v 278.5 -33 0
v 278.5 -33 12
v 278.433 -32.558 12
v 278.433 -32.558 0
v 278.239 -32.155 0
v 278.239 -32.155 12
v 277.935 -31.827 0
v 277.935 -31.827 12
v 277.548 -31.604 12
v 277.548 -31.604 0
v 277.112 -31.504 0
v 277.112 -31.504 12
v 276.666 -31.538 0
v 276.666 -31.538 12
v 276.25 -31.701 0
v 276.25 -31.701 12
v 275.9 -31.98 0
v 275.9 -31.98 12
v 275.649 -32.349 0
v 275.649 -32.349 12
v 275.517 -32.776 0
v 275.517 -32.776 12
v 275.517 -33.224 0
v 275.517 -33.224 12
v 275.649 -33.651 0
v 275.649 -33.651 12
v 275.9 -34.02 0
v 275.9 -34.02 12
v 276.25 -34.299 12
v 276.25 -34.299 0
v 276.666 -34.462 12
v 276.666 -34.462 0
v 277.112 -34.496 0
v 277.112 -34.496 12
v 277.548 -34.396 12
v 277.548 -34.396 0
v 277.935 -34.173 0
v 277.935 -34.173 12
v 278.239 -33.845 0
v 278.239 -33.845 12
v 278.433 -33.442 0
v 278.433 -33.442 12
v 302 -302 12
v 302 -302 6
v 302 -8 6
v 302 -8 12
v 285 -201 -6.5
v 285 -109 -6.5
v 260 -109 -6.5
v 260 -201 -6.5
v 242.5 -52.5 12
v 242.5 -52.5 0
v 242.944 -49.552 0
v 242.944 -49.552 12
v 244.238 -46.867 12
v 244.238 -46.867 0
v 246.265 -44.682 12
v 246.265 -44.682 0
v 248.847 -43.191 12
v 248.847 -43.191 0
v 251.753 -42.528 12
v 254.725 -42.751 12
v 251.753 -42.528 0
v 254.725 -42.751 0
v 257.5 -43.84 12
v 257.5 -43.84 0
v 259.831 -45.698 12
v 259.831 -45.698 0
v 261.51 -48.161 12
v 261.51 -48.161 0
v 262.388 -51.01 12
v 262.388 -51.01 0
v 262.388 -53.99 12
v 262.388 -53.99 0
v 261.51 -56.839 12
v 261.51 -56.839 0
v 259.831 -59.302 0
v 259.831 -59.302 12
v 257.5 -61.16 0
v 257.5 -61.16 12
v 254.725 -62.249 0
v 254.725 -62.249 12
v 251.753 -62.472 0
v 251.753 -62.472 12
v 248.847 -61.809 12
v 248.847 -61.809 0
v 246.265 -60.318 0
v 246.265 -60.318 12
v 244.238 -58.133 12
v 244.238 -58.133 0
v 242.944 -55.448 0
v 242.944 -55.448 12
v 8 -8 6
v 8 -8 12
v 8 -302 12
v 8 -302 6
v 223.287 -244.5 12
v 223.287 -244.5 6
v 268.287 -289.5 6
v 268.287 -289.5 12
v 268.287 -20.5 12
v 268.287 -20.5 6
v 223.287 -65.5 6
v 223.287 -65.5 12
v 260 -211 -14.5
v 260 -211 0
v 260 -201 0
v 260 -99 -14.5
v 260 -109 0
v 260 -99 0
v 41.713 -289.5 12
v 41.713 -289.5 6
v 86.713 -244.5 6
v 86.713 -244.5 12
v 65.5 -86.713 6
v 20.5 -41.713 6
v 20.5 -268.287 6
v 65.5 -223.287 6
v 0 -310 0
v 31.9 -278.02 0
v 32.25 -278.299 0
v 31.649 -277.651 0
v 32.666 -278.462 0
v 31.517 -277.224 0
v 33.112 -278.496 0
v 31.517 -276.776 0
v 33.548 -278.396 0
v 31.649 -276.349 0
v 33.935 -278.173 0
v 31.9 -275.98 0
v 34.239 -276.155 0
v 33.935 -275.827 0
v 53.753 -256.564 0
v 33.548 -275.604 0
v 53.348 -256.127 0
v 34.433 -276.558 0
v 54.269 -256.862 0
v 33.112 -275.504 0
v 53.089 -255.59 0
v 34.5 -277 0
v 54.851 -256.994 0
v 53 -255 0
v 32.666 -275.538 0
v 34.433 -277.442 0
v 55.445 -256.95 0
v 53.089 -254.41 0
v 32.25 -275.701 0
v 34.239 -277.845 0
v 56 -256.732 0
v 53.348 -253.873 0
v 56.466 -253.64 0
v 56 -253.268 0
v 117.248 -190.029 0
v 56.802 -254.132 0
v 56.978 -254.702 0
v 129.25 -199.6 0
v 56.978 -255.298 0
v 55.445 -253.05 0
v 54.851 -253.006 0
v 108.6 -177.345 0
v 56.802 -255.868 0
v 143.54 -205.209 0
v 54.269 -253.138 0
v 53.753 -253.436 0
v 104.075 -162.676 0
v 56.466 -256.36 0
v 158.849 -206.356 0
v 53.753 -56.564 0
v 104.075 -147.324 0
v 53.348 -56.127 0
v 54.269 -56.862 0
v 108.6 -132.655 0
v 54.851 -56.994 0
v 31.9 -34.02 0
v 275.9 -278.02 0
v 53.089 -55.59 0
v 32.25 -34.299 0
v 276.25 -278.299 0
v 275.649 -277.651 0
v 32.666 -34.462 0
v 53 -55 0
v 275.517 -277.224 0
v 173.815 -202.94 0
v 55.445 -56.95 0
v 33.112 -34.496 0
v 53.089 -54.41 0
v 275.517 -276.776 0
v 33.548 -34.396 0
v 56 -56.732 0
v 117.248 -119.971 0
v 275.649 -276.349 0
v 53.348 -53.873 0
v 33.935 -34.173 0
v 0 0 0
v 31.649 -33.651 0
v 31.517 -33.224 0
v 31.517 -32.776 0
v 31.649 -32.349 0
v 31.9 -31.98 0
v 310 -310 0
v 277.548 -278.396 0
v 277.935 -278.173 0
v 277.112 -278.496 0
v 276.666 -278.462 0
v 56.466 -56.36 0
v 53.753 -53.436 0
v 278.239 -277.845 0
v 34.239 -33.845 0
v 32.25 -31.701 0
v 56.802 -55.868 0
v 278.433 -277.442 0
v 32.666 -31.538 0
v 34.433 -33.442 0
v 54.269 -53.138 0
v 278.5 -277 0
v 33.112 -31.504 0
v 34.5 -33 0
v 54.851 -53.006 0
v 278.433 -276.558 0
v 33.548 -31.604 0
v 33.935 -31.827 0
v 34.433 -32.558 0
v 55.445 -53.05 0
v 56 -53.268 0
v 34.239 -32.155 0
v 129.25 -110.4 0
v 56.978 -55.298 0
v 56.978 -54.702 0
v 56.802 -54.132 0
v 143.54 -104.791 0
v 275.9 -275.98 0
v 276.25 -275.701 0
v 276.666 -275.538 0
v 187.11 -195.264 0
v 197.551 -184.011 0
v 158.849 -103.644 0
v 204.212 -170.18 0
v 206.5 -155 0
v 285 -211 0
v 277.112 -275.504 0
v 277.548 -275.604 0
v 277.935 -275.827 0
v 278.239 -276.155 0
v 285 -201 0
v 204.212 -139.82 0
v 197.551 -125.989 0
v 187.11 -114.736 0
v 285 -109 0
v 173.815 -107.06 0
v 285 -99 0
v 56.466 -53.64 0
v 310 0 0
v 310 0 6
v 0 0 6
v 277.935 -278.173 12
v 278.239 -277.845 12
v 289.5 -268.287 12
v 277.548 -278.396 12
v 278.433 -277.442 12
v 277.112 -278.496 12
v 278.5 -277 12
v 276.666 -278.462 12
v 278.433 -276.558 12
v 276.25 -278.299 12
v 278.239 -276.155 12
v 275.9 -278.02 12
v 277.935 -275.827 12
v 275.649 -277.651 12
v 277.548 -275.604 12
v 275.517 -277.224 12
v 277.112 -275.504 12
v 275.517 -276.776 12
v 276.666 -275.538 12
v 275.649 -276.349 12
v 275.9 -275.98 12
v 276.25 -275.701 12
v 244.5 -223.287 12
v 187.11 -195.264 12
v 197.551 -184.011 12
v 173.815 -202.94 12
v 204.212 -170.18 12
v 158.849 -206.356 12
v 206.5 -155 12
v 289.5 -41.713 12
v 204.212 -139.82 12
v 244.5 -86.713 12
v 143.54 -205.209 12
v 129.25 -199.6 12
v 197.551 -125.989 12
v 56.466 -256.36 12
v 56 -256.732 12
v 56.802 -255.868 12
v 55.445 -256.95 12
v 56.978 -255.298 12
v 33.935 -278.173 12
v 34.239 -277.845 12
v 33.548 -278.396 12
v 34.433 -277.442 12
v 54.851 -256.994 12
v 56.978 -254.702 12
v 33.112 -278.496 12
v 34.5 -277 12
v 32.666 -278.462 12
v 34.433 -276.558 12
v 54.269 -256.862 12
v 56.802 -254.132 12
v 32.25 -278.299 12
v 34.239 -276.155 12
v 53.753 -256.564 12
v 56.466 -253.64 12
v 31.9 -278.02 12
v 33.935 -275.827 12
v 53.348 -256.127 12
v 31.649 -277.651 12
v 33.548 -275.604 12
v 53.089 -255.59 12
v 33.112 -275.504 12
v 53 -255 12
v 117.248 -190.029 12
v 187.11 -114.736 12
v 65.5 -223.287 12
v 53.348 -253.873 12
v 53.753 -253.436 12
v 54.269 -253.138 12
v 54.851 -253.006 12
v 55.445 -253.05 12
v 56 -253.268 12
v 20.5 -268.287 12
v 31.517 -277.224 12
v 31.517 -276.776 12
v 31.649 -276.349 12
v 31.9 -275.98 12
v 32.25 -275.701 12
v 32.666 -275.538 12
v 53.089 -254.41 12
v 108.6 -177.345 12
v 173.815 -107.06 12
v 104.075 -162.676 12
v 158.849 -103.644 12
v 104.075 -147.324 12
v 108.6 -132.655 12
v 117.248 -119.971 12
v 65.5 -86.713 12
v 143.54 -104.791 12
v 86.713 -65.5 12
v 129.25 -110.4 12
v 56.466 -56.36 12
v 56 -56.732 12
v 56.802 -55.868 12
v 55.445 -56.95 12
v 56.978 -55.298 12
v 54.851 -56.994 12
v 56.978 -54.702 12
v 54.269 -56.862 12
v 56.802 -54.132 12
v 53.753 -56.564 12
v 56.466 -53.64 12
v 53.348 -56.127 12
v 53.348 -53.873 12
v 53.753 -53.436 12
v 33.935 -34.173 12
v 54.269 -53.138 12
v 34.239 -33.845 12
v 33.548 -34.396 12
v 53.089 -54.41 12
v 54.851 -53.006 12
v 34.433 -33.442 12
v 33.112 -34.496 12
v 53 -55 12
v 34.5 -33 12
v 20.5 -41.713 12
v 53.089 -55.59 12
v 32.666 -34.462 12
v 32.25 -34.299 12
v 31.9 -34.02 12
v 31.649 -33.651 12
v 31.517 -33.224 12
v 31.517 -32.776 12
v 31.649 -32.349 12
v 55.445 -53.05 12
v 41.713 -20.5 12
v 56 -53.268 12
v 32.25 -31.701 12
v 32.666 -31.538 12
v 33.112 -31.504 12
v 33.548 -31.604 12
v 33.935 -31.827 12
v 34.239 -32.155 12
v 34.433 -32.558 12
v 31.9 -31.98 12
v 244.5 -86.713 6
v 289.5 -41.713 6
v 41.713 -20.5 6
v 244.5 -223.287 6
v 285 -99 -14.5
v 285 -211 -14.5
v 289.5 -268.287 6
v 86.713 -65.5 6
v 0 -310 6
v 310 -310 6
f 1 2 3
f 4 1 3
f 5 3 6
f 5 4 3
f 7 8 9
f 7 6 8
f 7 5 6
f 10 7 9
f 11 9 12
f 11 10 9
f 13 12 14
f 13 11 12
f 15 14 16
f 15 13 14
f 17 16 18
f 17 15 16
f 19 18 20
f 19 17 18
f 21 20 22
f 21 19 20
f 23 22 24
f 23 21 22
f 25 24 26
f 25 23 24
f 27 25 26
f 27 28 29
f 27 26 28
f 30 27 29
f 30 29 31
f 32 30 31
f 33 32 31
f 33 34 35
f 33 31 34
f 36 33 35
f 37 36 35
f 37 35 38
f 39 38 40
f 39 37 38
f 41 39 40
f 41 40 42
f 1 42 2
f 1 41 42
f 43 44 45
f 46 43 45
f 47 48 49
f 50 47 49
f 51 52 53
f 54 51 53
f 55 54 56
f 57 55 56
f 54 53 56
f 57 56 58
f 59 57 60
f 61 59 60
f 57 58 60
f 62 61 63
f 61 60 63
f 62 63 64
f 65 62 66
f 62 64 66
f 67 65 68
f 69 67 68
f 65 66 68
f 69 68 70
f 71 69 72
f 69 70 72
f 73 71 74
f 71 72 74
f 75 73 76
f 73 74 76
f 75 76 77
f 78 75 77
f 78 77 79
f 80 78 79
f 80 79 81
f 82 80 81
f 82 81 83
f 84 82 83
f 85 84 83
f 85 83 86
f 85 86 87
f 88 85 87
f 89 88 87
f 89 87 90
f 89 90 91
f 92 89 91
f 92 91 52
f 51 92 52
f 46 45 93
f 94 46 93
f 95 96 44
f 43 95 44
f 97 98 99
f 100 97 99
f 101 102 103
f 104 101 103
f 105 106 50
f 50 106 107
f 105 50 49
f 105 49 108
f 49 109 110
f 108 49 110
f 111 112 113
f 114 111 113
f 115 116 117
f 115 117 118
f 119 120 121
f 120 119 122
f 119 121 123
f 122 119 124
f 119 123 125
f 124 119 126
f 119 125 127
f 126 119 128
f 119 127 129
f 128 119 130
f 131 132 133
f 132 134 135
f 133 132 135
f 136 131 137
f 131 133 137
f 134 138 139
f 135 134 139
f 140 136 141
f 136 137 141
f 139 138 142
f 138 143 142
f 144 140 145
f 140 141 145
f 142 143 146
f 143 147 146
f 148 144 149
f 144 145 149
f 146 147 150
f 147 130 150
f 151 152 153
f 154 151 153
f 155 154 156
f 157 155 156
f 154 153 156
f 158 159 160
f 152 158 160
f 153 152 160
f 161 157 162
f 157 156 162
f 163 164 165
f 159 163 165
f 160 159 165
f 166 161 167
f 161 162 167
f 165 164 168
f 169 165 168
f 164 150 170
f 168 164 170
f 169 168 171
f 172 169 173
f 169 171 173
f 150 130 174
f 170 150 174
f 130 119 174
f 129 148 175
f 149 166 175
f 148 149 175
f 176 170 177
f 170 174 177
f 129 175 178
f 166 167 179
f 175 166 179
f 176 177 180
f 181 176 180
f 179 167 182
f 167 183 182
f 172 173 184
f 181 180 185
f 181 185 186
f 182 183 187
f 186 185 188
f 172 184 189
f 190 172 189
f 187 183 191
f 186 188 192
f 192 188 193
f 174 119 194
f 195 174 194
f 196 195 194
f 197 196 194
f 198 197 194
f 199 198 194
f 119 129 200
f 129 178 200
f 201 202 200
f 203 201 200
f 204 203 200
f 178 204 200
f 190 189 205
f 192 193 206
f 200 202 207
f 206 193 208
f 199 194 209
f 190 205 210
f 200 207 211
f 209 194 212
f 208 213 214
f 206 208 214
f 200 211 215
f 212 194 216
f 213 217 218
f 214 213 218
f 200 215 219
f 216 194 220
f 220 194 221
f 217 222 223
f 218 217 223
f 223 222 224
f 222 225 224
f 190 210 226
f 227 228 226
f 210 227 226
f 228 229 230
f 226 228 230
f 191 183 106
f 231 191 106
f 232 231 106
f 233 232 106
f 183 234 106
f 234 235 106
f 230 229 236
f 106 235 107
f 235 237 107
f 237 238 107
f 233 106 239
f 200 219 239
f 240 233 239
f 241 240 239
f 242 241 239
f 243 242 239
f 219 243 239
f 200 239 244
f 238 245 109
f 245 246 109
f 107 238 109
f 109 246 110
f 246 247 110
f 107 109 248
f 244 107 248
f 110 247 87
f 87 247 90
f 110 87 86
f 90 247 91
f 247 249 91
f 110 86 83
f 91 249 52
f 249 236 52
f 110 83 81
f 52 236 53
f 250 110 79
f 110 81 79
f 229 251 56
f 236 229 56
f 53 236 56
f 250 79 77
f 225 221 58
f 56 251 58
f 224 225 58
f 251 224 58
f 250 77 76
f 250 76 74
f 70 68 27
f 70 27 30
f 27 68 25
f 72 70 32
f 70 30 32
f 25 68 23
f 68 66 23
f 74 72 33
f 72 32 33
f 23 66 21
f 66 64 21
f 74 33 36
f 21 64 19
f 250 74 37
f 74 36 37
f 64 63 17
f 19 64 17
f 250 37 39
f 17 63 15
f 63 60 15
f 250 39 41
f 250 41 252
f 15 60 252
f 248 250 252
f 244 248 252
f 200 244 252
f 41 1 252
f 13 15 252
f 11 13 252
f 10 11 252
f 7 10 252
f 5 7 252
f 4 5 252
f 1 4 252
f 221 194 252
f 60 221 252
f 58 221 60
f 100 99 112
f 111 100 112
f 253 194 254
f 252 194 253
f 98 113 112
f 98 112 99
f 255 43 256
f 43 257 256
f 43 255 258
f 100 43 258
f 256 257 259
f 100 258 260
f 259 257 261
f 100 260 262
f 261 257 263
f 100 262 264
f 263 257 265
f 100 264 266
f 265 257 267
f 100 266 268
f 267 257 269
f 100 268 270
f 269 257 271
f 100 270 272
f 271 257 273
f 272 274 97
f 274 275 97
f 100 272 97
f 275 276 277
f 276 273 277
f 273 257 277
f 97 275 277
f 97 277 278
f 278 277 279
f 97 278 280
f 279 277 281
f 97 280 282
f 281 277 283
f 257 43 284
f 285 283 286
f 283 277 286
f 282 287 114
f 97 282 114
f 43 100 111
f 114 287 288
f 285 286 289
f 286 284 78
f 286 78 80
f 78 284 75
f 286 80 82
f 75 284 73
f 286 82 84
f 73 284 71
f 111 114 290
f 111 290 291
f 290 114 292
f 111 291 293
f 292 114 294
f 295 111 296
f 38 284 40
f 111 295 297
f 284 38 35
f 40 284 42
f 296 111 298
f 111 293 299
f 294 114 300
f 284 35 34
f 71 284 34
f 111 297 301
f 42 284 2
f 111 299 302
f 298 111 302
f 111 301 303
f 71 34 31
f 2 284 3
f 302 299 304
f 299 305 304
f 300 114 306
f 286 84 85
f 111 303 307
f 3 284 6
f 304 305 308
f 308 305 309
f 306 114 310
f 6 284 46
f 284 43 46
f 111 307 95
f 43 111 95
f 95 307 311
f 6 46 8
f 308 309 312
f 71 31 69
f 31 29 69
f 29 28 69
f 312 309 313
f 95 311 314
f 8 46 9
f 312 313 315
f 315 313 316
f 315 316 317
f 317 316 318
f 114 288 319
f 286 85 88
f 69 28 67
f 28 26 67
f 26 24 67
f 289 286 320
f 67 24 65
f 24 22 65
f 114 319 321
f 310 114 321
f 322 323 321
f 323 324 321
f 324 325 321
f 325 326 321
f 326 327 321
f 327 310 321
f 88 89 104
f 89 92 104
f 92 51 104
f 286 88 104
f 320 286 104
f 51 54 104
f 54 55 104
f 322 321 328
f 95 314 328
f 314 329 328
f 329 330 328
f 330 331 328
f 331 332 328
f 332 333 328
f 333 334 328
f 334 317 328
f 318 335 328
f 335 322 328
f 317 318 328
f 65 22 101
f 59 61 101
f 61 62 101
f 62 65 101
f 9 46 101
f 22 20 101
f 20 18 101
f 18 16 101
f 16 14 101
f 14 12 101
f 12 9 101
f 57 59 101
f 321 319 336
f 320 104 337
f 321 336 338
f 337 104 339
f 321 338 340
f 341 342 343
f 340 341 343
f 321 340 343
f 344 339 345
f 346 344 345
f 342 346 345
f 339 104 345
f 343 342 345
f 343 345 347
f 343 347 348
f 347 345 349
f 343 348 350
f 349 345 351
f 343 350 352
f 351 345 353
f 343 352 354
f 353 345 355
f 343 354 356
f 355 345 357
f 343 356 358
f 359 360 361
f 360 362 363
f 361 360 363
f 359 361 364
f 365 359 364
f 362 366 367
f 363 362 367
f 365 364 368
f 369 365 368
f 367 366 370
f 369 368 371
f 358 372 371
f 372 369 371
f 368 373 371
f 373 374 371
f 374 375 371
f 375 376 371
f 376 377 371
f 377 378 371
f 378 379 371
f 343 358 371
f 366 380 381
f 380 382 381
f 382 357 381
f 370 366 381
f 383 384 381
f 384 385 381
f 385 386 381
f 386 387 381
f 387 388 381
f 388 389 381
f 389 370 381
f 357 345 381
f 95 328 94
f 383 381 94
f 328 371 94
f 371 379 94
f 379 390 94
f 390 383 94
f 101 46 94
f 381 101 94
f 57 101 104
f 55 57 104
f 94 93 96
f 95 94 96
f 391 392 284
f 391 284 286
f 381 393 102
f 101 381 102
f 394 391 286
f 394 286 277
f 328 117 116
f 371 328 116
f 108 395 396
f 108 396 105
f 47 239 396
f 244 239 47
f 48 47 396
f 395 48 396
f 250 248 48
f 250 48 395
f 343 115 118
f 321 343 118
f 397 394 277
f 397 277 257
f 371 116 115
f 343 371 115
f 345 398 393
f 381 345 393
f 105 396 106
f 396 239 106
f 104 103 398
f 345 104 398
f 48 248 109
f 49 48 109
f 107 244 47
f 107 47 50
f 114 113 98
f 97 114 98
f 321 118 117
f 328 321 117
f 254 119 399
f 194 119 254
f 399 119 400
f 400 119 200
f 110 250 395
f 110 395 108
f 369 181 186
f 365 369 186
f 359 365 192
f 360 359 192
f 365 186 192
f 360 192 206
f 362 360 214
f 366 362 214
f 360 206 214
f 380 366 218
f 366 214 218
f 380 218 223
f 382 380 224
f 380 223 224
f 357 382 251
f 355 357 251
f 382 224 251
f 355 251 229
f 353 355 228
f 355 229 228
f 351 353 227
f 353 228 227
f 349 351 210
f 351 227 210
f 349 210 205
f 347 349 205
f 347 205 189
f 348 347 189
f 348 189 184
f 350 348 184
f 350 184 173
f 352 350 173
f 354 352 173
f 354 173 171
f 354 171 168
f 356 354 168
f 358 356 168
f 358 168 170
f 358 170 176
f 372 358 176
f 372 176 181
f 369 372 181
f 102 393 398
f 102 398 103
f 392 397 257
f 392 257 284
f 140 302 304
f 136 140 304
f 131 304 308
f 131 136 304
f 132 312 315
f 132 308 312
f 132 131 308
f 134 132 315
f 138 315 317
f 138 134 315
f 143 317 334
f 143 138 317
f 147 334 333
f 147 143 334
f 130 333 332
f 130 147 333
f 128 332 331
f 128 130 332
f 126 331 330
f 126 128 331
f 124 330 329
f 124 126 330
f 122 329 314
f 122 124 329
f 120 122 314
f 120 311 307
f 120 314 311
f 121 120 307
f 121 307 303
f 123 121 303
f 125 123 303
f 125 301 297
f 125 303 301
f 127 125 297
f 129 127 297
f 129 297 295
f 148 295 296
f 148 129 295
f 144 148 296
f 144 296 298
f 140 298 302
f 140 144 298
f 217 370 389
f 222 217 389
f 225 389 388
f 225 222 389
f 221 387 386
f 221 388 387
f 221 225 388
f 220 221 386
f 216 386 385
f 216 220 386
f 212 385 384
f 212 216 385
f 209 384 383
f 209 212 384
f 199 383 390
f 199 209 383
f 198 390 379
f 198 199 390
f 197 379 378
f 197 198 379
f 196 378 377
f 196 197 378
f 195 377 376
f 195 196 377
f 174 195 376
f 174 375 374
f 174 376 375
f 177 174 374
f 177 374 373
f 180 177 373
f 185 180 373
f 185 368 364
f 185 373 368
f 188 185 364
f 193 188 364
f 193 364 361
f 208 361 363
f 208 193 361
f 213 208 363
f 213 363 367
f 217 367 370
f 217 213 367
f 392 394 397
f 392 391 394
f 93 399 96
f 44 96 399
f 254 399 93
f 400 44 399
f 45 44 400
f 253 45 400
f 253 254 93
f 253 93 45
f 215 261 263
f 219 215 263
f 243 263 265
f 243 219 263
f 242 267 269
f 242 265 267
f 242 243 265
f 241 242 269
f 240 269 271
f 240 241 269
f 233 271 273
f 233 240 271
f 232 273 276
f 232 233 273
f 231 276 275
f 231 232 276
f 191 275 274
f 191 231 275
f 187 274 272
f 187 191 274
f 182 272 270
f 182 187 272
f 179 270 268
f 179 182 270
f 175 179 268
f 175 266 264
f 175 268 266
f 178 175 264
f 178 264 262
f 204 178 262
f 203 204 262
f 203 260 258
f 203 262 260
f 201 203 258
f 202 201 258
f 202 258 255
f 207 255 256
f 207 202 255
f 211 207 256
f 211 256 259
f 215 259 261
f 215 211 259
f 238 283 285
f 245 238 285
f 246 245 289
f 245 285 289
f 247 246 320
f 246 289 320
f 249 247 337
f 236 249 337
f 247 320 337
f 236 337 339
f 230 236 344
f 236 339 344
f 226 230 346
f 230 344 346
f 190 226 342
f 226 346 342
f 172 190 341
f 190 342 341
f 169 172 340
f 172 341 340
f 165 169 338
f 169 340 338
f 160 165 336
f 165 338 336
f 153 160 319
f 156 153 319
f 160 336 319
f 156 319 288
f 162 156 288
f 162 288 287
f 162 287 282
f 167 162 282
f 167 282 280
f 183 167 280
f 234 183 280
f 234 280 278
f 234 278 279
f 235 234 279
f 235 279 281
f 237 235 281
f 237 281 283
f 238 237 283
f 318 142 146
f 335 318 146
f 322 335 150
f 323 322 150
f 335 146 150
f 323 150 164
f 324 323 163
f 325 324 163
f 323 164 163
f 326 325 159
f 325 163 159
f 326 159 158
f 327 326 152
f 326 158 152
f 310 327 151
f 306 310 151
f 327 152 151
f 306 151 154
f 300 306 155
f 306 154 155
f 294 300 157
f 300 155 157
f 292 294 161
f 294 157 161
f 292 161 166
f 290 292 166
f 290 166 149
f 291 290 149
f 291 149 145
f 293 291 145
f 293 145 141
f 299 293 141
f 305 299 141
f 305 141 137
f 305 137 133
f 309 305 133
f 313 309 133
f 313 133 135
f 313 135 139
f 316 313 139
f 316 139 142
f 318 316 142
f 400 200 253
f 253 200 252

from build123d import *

# Parameters (mm, degrees)
SKETCH1_W               = 310
SKETCH1_H               = 310
BOSS_EXTRUDE1_DEPTH     = 6
BOSS_EXTRUDE2_DEPTH     = 6
SKETCH4_R               = 51.5
CUT_EXTRUDE1_DEPTH      = 439.570404838
SKETCH10_R              = 10
CORNER_CORD_HOLE_DEPTH  = 439.570404838
SKETCH11_R              = 2
CUT_EXTRUDE5_DEPTH      = 439.570404838
SKETCH12_W              = 25
SKETCH12_H              = 10
BOSS_EXTRUDE3_DEPTH     = 6.5
SKETCH13_W              = 25
SKETCH13_H              = 112
BOSS_EXTRUDE4_DEPTH     = 8
CUT_EXTRUDE6_DEPTH      = 440.206386566
CUT_EXTRUDE6_DEPTH_BACK = 440.206386566
SKETCH14_R              = 1.5


with BuildPart() as part:
    # Sketch1 → Boss-Extrude1 (new body)
    with BuildSketch(Plane.XY):
        with Locations((155, -155)):
            Rectangle(SKETCH1_W, SKETCH1_H)
    extrude(amount=BOSS_EXTRUDE1_DEPTH)

    # Sketch3 → Boss-Extrude2 (add)
    with BuildSketch(Plane.XY.offset(6)):
        Polygon((302, -8), (302, -33), (302, -277), (302, -302), (277, -302), (33, -302), (8, -302), (8, -277), (8, -33), (8, -8), (33, -8), (277, -8), align=None)
        Polygon((268.286796564, -20.5), (223.286796564, -65.5), (86.713203436, -65.5), (41.713203436, -20.5), align=None, mode=Mode.SUBTRACT)
        Polygon((20.5, -41.713203436), (65.5, -86.713203436), (65.5, -223.286796564), (20.5, -268.286796564), align=None, mode=Mode.SUBTRACT)
        Polygon((41.713203436, -289.5), (86.713203436, -244.5), (223.286796564, -244.5), (268.286796564, -289.5), align=None, mode=Mode.SUBTRACT)
        Polygon((289.5, -41.713203436), (244.5, -86.713203436), (244.5, -223.286796564), (289.5, -268.286796564), align=None, mode=Mode.SUBTRACT)
    extrude(amount=BOSS_EXTRUDE2_DEPTH)

    # Sketch4 → Cut-Extrude1 (cut, through all)
    with BuildSketch(Plane.XY.offset(12)):
        with Locations((155, -155)):
            Circle(SKETCH4_R)
    extrude(amount=-CUT_EXTRUDE1_DEPTH, mode=Mode.SUBTRACT)

    # Sketch10 → corner cord hole (cut, through all)
    with BuildSketch(Plane(origin=(0, 0, 0), x_dir=(-1, 0, 0), z_dir=(0, 0, -1))):
        with Locations((-252.5, -52.5)):
            Circle(SKETCH10_R)
    extrude(amount=-CORNER_CORD_HOLE_DEPTH, mode=Mode.SUBTRACT)

    # Sketch11 → Cut-Extrude5 (cut, through all)
    with BuildSketch(Plane(origin=(0, 0, 0), x_dir=(-1, 0, 0), z_dir=(0, 0, -1))):
        with Locations((-55, -55)):
            Circle(SKETCH11_R)
        with Locations((-55, -255)):
            Circle(SKETCH11_R)
    extrude(amount=-CUT_EXTRUDE5_DEPTH, mode=Mode.SUBTRACT)

    # Sketch12 → Boss-Extrude3 (add)
    with BuildSketch(Plane(origin=(0, 0, 0), x_dir=(-1, 0, 0), z_dir=(0, 0, -1))):
        with Locations((-272.5, -104)):
            Rectangle(SKETCH12_W, SKETCH12_H)
        with Locations((-272.5, -206)):
            Rectangle(SKETCH12_W, SKETCH12_H)
    extrude(amount=BOSS_EXTRUDE3_DEPTH)

    # Sketch13 → Boss-Extrude4 (add)
    with BuildSketch(Plane(origin=(0, 0, -6.5), x_dir=(-1, 0, 0), z_dir=(0, 0, -1))):
        with Locations((-272.5, -155)):
            Rectangle(SKETCH13_W, SKETCH13_H)
    extrude(amount=BOSS_EXTRUDE4_DEPTH)

    # Sketch14 → Cut-Extrude6 (cut, two sides: drawn at the far end of the back side and taken through both)
    with BuildSketch(Plane.XY.offset(12).offset(-CUT_EXTRUDE6_DEPTH_BACK)):
        with Locations((33, -33)):
            Circle(SKETCH14_R)
        with Locations((277, -33)):
            Circle(SKETCH14_R)
        with Locations((277, -277)):
            Circle(SKETCH14_R)
        with Locations((33, -277)):
            Circle(SKETCH14_R)
    extrude(amount=CUT_EXTRUDE6_DEPTH + CUT_EXTRUDE6_DEPTH_BACK, mode=Mode.SUBTRACT)


solid = part.part
